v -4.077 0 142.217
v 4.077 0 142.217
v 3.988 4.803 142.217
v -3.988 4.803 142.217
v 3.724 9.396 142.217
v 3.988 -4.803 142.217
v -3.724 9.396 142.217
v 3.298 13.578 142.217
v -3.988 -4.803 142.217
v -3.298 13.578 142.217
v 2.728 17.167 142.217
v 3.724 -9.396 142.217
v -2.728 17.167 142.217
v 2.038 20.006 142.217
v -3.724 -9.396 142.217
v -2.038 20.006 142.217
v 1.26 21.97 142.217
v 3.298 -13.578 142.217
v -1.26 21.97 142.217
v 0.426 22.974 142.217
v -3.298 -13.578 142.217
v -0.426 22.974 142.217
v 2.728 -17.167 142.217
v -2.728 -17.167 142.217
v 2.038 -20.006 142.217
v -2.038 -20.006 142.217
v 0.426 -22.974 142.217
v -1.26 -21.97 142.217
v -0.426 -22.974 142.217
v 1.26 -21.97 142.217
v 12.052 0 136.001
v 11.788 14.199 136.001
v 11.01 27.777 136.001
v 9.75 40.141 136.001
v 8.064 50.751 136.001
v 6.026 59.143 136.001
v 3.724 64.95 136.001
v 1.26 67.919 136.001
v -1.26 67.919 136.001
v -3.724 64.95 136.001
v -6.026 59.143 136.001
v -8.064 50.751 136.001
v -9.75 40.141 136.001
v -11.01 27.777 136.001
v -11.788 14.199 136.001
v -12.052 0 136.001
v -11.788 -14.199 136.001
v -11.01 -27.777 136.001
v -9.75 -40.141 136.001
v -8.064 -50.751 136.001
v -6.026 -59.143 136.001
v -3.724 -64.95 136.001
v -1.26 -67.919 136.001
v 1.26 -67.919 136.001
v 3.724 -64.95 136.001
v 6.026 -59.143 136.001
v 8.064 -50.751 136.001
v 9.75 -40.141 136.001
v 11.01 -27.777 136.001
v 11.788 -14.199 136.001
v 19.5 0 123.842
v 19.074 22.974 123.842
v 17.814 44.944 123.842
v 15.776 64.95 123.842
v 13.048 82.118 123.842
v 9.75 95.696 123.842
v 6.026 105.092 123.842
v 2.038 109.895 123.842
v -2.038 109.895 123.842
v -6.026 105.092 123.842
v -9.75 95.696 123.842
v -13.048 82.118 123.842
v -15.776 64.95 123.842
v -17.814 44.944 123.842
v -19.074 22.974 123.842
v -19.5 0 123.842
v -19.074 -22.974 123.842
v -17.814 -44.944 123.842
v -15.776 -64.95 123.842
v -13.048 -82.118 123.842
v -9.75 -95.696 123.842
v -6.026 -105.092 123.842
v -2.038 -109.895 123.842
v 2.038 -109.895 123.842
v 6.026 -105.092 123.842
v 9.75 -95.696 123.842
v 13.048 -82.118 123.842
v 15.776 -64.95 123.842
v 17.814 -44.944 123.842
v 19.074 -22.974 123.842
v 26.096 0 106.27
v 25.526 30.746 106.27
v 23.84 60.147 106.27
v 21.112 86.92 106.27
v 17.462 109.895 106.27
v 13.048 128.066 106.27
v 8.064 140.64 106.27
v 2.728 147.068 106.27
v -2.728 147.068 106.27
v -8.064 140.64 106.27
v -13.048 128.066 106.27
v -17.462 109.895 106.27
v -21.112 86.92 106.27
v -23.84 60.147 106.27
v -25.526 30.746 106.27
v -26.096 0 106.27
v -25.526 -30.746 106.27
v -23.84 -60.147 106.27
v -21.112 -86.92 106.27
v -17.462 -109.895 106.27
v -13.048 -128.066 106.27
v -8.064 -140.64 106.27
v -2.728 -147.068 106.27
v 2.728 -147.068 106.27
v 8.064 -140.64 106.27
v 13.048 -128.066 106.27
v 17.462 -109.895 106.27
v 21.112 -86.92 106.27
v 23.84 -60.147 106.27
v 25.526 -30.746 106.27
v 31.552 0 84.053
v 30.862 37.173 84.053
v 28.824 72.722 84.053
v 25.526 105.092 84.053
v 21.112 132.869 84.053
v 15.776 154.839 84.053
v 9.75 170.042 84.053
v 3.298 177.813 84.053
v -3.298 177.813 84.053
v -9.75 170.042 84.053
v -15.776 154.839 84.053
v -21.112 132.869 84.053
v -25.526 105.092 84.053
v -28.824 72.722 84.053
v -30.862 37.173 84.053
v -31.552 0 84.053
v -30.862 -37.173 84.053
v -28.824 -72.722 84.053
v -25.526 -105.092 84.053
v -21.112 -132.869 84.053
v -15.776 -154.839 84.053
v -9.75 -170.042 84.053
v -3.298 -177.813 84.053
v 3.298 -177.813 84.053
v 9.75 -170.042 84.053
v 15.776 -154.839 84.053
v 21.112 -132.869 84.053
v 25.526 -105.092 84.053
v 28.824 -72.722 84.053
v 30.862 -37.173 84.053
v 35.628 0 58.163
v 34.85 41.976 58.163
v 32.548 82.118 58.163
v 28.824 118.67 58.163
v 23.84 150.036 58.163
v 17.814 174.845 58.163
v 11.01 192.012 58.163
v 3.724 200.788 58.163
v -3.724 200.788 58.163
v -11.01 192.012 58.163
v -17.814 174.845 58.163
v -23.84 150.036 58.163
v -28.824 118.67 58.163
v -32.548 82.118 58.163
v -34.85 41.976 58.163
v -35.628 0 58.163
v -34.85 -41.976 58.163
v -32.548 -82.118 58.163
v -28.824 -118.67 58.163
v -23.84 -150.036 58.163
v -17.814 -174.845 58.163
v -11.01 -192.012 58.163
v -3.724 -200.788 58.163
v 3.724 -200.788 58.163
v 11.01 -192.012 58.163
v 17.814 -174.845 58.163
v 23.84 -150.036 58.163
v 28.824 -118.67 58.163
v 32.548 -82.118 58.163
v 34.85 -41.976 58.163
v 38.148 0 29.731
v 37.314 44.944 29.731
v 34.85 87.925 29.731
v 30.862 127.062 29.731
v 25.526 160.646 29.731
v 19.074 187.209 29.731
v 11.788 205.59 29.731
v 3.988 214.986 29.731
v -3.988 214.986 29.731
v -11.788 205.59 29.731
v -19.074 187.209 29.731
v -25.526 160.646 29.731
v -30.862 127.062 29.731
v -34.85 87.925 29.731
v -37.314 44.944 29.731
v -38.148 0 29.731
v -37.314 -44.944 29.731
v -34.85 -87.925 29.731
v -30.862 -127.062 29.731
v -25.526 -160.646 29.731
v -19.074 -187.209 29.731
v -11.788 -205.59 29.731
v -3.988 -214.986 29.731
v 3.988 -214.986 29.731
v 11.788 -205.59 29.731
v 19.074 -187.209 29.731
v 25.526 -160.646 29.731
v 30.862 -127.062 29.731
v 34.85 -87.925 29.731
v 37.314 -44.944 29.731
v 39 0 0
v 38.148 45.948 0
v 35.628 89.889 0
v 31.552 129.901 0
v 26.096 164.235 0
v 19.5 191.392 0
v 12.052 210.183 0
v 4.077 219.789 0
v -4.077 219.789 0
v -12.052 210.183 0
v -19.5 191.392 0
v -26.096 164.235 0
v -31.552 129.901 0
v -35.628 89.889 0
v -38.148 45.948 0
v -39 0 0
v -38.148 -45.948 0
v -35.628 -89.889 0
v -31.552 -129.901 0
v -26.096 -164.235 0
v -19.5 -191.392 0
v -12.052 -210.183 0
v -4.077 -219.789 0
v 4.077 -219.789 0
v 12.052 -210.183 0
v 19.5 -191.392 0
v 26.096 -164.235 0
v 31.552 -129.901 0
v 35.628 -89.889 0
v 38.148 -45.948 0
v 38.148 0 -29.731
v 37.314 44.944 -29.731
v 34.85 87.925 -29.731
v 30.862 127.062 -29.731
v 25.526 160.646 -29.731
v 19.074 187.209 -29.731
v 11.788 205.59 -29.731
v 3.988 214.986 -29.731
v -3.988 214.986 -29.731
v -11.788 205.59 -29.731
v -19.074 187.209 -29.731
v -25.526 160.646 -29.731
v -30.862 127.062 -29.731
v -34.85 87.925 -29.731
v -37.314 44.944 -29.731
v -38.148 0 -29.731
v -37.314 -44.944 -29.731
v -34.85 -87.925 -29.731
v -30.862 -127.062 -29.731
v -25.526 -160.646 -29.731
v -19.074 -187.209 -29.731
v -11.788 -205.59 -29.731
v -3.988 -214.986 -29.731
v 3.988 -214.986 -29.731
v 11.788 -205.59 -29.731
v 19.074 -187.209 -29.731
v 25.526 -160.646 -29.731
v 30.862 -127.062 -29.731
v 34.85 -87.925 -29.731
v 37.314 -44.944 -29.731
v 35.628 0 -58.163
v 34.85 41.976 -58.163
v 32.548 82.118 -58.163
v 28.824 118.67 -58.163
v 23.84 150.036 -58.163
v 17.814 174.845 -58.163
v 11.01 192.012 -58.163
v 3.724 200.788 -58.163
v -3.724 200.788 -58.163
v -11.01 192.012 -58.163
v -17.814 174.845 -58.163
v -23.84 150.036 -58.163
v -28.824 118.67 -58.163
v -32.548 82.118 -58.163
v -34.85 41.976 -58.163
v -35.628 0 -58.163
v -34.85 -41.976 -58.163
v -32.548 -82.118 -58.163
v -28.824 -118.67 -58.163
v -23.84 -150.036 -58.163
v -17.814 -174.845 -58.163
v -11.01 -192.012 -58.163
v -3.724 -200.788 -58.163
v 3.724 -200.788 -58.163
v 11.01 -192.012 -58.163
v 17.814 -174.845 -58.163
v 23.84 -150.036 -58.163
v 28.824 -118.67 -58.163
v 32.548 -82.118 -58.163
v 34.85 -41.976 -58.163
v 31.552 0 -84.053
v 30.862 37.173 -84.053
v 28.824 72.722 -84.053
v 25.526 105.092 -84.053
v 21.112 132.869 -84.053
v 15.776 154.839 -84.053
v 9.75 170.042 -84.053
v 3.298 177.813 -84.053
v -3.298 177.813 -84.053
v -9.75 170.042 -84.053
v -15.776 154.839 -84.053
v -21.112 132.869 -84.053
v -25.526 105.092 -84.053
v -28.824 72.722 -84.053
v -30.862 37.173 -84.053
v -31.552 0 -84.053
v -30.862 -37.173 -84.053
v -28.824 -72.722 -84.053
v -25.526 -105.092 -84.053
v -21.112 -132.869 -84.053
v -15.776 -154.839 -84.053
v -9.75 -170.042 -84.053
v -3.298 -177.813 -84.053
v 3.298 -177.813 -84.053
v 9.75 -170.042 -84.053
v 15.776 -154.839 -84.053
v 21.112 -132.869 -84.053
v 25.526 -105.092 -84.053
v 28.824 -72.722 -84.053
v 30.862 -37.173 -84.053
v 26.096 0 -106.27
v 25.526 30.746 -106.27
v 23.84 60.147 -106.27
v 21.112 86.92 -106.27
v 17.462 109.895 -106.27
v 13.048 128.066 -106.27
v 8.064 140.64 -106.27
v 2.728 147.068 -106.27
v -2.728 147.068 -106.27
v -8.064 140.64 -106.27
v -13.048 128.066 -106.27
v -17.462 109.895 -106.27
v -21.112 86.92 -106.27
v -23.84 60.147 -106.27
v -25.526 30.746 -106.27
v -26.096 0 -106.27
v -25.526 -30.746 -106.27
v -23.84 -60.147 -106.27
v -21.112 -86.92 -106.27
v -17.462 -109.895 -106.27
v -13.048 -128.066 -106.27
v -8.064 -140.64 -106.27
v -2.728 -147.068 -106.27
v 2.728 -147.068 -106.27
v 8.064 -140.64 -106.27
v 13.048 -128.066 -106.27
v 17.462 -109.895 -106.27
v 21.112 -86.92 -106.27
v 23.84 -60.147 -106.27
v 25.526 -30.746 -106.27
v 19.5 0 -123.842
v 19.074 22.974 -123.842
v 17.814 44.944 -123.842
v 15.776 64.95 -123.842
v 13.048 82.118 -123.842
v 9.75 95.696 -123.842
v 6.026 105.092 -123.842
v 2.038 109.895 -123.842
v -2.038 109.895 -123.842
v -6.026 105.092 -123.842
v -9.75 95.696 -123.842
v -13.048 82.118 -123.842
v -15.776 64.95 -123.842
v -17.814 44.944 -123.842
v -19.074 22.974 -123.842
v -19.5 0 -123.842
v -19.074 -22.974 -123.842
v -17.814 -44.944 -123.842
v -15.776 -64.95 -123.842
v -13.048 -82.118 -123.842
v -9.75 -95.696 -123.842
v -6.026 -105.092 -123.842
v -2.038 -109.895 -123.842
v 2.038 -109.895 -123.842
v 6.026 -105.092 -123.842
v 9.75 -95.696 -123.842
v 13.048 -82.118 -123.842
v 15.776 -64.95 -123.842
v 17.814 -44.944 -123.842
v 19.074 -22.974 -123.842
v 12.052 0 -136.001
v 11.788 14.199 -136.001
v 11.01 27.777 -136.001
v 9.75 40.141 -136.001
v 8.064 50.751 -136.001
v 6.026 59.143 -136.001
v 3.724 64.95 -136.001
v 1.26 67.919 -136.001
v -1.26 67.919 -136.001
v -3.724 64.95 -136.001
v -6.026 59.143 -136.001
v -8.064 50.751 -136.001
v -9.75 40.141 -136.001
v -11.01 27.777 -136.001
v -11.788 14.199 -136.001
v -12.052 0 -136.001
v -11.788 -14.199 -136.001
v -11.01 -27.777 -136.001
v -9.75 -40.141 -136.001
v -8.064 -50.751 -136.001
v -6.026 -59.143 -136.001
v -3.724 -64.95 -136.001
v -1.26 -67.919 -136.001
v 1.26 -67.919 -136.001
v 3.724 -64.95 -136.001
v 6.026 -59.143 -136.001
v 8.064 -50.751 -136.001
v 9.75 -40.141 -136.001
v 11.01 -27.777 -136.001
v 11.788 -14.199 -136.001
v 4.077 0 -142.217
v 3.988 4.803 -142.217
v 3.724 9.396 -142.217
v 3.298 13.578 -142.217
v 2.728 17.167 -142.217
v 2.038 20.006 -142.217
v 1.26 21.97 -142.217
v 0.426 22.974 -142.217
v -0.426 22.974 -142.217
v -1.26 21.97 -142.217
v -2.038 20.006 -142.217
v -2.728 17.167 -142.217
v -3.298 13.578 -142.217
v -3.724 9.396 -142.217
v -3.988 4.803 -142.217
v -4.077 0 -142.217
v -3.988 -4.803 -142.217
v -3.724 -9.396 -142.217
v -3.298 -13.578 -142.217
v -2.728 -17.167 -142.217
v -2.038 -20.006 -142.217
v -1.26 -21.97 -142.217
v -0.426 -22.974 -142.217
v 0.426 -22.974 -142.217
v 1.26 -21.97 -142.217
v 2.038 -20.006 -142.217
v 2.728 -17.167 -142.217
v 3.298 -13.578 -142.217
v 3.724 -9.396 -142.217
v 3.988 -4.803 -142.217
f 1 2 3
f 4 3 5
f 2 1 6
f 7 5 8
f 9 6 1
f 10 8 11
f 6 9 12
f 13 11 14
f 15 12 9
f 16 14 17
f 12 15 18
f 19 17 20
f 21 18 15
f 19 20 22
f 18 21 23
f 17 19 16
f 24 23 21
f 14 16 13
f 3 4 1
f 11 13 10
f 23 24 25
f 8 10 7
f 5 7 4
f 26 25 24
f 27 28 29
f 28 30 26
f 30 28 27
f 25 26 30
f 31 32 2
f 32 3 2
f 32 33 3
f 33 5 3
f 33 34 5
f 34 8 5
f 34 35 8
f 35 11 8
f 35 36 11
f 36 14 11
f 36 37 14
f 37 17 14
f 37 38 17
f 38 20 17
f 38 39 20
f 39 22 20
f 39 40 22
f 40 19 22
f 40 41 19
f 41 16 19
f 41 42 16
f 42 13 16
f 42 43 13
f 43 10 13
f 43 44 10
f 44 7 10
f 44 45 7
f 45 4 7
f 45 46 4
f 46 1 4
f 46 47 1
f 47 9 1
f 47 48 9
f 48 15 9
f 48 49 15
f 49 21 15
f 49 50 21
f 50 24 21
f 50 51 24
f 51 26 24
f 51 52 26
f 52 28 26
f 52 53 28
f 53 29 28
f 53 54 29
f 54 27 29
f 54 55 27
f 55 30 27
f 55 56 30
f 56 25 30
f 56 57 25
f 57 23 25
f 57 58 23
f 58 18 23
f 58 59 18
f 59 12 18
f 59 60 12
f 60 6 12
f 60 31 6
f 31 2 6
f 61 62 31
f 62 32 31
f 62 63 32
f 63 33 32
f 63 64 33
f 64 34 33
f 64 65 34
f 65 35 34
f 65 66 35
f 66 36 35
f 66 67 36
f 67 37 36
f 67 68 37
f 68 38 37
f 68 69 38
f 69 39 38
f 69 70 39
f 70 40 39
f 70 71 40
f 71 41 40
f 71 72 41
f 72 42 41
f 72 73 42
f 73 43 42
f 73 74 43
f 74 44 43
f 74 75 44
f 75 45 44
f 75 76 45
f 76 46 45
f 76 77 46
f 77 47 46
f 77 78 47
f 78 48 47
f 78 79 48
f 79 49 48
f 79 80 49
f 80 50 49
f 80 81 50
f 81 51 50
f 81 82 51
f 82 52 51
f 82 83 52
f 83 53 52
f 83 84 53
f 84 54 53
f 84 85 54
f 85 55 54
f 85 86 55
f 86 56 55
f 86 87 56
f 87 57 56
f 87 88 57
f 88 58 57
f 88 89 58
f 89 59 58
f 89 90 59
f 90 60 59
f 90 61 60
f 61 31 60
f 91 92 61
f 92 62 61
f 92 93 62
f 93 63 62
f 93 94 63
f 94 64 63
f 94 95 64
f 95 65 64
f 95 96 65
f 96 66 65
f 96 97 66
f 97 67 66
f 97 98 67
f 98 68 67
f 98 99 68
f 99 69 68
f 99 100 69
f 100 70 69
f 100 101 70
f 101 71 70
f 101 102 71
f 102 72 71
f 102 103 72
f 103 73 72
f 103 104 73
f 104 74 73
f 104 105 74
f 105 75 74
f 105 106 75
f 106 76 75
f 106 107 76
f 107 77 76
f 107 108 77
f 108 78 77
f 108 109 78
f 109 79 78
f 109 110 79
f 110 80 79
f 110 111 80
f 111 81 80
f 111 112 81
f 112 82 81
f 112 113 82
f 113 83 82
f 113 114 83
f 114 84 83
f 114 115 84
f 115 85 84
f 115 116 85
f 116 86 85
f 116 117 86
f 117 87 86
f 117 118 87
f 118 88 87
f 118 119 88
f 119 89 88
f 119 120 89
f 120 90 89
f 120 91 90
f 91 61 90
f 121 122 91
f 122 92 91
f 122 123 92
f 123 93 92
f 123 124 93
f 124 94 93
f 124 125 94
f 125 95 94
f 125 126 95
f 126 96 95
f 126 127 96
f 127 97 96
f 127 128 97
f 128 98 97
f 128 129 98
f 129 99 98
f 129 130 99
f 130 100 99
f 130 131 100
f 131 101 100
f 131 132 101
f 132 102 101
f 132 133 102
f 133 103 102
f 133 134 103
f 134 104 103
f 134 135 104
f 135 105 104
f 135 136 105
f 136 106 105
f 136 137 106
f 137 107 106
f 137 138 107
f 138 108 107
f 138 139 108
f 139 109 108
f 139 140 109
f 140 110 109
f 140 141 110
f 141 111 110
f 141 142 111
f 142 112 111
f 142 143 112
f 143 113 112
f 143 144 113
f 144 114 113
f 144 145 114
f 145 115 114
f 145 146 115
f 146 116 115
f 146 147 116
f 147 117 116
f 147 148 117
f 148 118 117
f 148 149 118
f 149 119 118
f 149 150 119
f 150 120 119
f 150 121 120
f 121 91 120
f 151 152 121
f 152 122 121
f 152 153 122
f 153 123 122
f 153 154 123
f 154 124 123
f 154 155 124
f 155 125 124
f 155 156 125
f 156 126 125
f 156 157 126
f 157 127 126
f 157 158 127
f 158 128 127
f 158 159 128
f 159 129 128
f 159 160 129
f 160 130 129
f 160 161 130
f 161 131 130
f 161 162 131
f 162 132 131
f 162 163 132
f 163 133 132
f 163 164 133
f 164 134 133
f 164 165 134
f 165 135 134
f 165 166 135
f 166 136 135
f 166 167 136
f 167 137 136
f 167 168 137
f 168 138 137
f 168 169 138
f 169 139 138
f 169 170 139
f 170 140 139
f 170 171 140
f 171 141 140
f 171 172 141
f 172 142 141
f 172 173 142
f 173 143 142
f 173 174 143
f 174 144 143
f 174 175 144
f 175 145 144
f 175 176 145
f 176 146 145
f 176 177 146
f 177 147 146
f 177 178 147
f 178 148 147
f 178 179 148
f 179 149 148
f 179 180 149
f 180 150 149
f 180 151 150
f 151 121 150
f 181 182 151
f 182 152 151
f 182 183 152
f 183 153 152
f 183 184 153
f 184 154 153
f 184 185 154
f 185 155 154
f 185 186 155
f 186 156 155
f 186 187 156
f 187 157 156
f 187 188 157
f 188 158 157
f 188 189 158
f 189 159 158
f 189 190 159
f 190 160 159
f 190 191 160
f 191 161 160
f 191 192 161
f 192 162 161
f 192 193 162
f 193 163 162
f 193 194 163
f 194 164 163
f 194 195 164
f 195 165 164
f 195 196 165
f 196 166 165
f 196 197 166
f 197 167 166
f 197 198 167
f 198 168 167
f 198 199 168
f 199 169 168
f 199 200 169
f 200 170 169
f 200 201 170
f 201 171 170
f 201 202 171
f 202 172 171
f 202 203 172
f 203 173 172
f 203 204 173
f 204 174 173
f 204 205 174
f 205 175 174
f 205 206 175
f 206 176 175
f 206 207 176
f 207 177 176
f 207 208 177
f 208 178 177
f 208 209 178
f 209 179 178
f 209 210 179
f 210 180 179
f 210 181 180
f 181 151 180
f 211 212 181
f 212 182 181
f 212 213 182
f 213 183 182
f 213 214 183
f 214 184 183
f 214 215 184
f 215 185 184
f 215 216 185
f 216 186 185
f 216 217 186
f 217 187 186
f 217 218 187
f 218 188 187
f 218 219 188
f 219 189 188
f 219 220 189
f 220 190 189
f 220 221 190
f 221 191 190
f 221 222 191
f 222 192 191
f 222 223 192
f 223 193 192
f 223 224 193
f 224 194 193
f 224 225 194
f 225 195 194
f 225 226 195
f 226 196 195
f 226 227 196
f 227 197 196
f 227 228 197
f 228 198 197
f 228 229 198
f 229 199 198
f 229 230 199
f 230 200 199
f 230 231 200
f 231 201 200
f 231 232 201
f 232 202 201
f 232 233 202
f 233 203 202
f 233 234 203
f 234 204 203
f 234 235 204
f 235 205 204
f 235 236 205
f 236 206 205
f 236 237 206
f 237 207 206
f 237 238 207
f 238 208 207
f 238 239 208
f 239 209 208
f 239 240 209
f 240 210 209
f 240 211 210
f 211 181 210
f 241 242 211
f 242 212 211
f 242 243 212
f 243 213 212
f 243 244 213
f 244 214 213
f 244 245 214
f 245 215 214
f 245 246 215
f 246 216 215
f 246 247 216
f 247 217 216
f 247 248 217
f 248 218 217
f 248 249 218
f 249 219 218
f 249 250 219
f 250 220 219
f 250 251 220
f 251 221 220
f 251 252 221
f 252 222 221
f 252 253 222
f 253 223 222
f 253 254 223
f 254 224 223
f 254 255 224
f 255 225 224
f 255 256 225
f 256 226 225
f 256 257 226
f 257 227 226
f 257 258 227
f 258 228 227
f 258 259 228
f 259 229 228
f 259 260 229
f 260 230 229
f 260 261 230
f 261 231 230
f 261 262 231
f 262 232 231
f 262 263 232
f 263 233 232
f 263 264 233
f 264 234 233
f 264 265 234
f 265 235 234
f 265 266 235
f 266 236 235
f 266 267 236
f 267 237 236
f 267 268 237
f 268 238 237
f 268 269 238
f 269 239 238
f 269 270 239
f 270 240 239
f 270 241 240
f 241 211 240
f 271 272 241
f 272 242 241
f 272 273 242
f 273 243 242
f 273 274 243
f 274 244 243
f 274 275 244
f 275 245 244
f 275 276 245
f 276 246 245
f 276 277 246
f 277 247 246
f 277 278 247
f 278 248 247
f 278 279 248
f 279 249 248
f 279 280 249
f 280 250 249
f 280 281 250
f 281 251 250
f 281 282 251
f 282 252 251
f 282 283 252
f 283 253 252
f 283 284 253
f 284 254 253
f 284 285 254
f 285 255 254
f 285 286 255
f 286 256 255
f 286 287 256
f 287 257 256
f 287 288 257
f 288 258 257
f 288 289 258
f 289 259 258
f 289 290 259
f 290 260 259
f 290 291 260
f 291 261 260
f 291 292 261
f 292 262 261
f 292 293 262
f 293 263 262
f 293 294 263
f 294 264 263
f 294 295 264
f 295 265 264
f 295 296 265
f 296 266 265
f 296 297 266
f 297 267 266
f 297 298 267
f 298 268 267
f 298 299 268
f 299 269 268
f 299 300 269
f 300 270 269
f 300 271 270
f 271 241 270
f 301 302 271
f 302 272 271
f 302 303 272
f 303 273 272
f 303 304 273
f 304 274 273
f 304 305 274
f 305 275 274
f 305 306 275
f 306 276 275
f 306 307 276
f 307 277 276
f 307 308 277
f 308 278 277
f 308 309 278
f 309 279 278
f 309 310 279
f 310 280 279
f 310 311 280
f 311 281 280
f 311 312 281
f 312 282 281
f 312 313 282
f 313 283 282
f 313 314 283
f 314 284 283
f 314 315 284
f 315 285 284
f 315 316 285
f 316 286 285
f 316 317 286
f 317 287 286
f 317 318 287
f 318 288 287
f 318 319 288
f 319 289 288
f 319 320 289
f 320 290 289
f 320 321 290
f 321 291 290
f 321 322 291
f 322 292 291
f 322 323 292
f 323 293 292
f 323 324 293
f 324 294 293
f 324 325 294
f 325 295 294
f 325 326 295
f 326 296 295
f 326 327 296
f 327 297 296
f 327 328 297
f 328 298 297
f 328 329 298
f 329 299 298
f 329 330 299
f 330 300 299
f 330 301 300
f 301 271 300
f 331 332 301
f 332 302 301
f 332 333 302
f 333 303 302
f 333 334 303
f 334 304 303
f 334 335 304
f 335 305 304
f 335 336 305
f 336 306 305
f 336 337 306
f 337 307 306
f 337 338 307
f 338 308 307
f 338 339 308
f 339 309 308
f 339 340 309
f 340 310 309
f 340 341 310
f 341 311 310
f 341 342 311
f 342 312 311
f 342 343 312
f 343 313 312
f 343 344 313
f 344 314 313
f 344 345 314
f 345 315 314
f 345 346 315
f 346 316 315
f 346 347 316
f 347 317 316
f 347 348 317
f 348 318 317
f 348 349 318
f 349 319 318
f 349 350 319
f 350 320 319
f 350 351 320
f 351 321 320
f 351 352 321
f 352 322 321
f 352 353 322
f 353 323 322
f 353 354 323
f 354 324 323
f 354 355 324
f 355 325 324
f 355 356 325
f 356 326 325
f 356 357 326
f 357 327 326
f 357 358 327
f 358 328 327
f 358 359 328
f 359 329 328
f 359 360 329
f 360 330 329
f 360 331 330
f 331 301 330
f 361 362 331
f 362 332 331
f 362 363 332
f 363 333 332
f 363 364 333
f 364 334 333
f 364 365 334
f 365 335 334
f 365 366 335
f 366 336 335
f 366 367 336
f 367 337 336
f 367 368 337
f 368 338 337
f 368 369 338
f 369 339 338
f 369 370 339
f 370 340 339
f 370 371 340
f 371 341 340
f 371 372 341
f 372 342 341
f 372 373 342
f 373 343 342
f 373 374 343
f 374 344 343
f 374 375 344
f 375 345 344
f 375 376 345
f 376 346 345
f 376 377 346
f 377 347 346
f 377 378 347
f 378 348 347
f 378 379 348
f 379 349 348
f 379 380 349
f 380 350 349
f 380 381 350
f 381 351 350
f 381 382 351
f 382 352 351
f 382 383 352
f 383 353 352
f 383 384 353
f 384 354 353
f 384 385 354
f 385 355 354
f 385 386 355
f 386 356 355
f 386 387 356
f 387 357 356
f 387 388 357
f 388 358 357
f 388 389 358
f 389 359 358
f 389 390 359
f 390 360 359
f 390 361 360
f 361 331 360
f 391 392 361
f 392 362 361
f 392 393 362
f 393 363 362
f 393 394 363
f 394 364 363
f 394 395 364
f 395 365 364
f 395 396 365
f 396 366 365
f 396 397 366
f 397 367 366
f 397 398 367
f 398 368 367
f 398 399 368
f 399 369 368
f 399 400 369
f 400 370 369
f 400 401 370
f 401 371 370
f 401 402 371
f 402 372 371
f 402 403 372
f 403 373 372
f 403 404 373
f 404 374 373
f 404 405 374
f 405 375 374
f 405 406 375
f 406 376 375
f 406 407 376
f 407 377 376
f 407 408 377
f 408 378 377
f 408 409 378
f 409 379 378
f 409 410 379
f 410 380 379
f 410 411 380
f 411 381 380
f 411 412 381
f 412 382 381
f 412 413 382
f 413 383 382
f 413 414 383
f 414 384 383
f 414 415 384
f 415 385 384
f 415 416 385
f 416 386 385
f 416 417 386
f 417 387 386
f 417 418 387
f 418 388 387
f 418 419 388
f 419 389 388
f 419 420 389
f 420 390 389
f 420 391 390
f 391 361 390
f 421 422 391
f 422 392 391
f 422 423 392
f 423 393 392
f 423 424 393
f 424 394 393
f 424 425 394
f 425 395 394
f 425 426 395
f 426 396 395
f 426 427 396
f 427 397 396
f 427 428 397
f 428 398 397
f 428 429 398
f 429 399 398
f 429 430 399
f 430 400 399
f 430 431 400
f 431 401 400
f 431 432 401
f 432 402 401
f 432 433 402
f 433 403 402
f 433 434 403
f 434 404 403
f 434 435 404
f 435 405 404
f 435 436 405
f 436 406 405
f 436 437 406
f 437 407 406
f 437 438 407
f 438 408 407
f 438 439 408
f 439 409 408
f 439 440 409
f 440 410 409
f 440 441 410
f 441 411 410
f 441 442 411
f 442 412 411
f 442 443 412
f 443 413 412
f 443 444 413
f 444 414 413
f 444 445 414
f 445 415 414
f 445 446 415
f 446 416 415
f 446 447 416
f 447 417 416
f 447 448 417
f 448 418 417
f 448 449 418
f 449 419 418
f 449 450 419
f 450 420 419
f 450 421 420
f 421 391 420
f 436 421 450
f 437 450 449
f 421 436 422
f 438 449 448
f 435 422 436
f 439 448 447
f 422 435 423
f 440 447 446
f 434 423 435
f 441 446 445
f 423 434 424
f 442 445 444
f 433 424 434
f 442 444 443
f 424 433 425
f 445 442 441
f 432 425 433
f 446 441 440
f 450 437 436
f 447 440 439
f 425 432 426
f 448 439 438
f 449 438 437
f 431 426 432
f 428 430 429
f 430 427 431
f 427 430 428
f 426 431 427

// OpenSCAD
// Generated by SolidPython 1.0.1 on 2020-07-29 00:46:46


scale(v = [3, 17, 11]) {
	sphere(r = 13);
}
/***********************************************
*********      SolidPython code:      **********
************************************************
 
# import packages: SolidPython
from solid import *
from solid.utils import *
from itertools import chain, combinations, permutations


class Resize:

    def __init__(self, scad_file):
        self.scad_file = scad_file
        #self.scad_file = import_scad(scad_file)
        # cone/cylinder param:
        self.r1 = 0
        self.r2 = 0
        self.h = 0
        # rectangular prism param:
        self.w = 0
        self.l = 0
        # ellipse param:
        self.r = 0

    # import OpenScad code (file name corresponds to shape)


    # classify shape + parameters
    def assign(self, param1, param2, param3):
        if self.scad_file == 'cone.scad':
            self.r1 = param1
            self.r2 = param2
            self.h = param3
        elif self.scad_file == 'cylinder.scad':
            self.r1 = param1
            self.r2 = param2
            self.h = param3
        elif self.scad_file == 'rectangularPrism.scad':
            self.h = param1
            self.l = param2
            self.w = param3
        else:
            self.r = param1
            self.h = param2

    # resize parameters
    def iterate(self):
        x = range(3, 20, 2)
        i = 1
        if self.scad_file == 'cone.scad':
            tempList = list(permutations(x, 2))
            for temp in tempList:
                param1 = temp[0]
                param2 = temp[1]
                filepath = 'produced_scad_files/' + 'cone' + str(param1) + '_' + str(param2) + '_' + '.scad'
                scad_render_to_file(cylinder(h=param1, r1=param2, r2=0), filepath)

        elif self.scad_file == 'cylinder.scad':
            tempList = list(permutations(x, 3))
            for temp in tempList:
                param1 = temp[0]
                param2 = temp[1]
                filepath = 'produced_scad_files/' + 'cylinder' + str(param1) + '_' + str(param2) + '_' + '.scad'
                scad_render_to_file(cylinder(h=param1, r1=param2, r2=param2), filepath)

        elif self.scad_file == 'rectangularPrism.scad':
            tempList = list(permutations(x, 3))
            for temp in tempList:
                param1 = temp[0]
                param2 = temp[1]
                param3 = temp[2]
                filepath = 'produced_scad_files/' + 'rectangularPrism' + str(param1) + '_' + str(param2) + '_' + str(
                    param3) + '.scad'
                scad_render_to_file(cube(size=(param1, param2, param3)), filepath)

        elif self.scad_file == 'ellipse.scad':
            tempList = list(permutations(x, 4))
            for temp in tempList:
                param1 = temp[0]
                param2 = temp[1]
                param3 = temp[2]
                param4 = temp[3]
                filepath = 'produced_scad_files/' + 'ellipse' + str(param1) + '_' + str(param2) + '_' + str(param3) + '_' + str(param4) + '.scad'
                scad_render_to_file(scale([param1, param2, param3])(sphere(r=param4)), filepath)

    def render_to_scadfile(self):
        scad_render_to_file(scad, 'example.scad') 
 
************************************************/
